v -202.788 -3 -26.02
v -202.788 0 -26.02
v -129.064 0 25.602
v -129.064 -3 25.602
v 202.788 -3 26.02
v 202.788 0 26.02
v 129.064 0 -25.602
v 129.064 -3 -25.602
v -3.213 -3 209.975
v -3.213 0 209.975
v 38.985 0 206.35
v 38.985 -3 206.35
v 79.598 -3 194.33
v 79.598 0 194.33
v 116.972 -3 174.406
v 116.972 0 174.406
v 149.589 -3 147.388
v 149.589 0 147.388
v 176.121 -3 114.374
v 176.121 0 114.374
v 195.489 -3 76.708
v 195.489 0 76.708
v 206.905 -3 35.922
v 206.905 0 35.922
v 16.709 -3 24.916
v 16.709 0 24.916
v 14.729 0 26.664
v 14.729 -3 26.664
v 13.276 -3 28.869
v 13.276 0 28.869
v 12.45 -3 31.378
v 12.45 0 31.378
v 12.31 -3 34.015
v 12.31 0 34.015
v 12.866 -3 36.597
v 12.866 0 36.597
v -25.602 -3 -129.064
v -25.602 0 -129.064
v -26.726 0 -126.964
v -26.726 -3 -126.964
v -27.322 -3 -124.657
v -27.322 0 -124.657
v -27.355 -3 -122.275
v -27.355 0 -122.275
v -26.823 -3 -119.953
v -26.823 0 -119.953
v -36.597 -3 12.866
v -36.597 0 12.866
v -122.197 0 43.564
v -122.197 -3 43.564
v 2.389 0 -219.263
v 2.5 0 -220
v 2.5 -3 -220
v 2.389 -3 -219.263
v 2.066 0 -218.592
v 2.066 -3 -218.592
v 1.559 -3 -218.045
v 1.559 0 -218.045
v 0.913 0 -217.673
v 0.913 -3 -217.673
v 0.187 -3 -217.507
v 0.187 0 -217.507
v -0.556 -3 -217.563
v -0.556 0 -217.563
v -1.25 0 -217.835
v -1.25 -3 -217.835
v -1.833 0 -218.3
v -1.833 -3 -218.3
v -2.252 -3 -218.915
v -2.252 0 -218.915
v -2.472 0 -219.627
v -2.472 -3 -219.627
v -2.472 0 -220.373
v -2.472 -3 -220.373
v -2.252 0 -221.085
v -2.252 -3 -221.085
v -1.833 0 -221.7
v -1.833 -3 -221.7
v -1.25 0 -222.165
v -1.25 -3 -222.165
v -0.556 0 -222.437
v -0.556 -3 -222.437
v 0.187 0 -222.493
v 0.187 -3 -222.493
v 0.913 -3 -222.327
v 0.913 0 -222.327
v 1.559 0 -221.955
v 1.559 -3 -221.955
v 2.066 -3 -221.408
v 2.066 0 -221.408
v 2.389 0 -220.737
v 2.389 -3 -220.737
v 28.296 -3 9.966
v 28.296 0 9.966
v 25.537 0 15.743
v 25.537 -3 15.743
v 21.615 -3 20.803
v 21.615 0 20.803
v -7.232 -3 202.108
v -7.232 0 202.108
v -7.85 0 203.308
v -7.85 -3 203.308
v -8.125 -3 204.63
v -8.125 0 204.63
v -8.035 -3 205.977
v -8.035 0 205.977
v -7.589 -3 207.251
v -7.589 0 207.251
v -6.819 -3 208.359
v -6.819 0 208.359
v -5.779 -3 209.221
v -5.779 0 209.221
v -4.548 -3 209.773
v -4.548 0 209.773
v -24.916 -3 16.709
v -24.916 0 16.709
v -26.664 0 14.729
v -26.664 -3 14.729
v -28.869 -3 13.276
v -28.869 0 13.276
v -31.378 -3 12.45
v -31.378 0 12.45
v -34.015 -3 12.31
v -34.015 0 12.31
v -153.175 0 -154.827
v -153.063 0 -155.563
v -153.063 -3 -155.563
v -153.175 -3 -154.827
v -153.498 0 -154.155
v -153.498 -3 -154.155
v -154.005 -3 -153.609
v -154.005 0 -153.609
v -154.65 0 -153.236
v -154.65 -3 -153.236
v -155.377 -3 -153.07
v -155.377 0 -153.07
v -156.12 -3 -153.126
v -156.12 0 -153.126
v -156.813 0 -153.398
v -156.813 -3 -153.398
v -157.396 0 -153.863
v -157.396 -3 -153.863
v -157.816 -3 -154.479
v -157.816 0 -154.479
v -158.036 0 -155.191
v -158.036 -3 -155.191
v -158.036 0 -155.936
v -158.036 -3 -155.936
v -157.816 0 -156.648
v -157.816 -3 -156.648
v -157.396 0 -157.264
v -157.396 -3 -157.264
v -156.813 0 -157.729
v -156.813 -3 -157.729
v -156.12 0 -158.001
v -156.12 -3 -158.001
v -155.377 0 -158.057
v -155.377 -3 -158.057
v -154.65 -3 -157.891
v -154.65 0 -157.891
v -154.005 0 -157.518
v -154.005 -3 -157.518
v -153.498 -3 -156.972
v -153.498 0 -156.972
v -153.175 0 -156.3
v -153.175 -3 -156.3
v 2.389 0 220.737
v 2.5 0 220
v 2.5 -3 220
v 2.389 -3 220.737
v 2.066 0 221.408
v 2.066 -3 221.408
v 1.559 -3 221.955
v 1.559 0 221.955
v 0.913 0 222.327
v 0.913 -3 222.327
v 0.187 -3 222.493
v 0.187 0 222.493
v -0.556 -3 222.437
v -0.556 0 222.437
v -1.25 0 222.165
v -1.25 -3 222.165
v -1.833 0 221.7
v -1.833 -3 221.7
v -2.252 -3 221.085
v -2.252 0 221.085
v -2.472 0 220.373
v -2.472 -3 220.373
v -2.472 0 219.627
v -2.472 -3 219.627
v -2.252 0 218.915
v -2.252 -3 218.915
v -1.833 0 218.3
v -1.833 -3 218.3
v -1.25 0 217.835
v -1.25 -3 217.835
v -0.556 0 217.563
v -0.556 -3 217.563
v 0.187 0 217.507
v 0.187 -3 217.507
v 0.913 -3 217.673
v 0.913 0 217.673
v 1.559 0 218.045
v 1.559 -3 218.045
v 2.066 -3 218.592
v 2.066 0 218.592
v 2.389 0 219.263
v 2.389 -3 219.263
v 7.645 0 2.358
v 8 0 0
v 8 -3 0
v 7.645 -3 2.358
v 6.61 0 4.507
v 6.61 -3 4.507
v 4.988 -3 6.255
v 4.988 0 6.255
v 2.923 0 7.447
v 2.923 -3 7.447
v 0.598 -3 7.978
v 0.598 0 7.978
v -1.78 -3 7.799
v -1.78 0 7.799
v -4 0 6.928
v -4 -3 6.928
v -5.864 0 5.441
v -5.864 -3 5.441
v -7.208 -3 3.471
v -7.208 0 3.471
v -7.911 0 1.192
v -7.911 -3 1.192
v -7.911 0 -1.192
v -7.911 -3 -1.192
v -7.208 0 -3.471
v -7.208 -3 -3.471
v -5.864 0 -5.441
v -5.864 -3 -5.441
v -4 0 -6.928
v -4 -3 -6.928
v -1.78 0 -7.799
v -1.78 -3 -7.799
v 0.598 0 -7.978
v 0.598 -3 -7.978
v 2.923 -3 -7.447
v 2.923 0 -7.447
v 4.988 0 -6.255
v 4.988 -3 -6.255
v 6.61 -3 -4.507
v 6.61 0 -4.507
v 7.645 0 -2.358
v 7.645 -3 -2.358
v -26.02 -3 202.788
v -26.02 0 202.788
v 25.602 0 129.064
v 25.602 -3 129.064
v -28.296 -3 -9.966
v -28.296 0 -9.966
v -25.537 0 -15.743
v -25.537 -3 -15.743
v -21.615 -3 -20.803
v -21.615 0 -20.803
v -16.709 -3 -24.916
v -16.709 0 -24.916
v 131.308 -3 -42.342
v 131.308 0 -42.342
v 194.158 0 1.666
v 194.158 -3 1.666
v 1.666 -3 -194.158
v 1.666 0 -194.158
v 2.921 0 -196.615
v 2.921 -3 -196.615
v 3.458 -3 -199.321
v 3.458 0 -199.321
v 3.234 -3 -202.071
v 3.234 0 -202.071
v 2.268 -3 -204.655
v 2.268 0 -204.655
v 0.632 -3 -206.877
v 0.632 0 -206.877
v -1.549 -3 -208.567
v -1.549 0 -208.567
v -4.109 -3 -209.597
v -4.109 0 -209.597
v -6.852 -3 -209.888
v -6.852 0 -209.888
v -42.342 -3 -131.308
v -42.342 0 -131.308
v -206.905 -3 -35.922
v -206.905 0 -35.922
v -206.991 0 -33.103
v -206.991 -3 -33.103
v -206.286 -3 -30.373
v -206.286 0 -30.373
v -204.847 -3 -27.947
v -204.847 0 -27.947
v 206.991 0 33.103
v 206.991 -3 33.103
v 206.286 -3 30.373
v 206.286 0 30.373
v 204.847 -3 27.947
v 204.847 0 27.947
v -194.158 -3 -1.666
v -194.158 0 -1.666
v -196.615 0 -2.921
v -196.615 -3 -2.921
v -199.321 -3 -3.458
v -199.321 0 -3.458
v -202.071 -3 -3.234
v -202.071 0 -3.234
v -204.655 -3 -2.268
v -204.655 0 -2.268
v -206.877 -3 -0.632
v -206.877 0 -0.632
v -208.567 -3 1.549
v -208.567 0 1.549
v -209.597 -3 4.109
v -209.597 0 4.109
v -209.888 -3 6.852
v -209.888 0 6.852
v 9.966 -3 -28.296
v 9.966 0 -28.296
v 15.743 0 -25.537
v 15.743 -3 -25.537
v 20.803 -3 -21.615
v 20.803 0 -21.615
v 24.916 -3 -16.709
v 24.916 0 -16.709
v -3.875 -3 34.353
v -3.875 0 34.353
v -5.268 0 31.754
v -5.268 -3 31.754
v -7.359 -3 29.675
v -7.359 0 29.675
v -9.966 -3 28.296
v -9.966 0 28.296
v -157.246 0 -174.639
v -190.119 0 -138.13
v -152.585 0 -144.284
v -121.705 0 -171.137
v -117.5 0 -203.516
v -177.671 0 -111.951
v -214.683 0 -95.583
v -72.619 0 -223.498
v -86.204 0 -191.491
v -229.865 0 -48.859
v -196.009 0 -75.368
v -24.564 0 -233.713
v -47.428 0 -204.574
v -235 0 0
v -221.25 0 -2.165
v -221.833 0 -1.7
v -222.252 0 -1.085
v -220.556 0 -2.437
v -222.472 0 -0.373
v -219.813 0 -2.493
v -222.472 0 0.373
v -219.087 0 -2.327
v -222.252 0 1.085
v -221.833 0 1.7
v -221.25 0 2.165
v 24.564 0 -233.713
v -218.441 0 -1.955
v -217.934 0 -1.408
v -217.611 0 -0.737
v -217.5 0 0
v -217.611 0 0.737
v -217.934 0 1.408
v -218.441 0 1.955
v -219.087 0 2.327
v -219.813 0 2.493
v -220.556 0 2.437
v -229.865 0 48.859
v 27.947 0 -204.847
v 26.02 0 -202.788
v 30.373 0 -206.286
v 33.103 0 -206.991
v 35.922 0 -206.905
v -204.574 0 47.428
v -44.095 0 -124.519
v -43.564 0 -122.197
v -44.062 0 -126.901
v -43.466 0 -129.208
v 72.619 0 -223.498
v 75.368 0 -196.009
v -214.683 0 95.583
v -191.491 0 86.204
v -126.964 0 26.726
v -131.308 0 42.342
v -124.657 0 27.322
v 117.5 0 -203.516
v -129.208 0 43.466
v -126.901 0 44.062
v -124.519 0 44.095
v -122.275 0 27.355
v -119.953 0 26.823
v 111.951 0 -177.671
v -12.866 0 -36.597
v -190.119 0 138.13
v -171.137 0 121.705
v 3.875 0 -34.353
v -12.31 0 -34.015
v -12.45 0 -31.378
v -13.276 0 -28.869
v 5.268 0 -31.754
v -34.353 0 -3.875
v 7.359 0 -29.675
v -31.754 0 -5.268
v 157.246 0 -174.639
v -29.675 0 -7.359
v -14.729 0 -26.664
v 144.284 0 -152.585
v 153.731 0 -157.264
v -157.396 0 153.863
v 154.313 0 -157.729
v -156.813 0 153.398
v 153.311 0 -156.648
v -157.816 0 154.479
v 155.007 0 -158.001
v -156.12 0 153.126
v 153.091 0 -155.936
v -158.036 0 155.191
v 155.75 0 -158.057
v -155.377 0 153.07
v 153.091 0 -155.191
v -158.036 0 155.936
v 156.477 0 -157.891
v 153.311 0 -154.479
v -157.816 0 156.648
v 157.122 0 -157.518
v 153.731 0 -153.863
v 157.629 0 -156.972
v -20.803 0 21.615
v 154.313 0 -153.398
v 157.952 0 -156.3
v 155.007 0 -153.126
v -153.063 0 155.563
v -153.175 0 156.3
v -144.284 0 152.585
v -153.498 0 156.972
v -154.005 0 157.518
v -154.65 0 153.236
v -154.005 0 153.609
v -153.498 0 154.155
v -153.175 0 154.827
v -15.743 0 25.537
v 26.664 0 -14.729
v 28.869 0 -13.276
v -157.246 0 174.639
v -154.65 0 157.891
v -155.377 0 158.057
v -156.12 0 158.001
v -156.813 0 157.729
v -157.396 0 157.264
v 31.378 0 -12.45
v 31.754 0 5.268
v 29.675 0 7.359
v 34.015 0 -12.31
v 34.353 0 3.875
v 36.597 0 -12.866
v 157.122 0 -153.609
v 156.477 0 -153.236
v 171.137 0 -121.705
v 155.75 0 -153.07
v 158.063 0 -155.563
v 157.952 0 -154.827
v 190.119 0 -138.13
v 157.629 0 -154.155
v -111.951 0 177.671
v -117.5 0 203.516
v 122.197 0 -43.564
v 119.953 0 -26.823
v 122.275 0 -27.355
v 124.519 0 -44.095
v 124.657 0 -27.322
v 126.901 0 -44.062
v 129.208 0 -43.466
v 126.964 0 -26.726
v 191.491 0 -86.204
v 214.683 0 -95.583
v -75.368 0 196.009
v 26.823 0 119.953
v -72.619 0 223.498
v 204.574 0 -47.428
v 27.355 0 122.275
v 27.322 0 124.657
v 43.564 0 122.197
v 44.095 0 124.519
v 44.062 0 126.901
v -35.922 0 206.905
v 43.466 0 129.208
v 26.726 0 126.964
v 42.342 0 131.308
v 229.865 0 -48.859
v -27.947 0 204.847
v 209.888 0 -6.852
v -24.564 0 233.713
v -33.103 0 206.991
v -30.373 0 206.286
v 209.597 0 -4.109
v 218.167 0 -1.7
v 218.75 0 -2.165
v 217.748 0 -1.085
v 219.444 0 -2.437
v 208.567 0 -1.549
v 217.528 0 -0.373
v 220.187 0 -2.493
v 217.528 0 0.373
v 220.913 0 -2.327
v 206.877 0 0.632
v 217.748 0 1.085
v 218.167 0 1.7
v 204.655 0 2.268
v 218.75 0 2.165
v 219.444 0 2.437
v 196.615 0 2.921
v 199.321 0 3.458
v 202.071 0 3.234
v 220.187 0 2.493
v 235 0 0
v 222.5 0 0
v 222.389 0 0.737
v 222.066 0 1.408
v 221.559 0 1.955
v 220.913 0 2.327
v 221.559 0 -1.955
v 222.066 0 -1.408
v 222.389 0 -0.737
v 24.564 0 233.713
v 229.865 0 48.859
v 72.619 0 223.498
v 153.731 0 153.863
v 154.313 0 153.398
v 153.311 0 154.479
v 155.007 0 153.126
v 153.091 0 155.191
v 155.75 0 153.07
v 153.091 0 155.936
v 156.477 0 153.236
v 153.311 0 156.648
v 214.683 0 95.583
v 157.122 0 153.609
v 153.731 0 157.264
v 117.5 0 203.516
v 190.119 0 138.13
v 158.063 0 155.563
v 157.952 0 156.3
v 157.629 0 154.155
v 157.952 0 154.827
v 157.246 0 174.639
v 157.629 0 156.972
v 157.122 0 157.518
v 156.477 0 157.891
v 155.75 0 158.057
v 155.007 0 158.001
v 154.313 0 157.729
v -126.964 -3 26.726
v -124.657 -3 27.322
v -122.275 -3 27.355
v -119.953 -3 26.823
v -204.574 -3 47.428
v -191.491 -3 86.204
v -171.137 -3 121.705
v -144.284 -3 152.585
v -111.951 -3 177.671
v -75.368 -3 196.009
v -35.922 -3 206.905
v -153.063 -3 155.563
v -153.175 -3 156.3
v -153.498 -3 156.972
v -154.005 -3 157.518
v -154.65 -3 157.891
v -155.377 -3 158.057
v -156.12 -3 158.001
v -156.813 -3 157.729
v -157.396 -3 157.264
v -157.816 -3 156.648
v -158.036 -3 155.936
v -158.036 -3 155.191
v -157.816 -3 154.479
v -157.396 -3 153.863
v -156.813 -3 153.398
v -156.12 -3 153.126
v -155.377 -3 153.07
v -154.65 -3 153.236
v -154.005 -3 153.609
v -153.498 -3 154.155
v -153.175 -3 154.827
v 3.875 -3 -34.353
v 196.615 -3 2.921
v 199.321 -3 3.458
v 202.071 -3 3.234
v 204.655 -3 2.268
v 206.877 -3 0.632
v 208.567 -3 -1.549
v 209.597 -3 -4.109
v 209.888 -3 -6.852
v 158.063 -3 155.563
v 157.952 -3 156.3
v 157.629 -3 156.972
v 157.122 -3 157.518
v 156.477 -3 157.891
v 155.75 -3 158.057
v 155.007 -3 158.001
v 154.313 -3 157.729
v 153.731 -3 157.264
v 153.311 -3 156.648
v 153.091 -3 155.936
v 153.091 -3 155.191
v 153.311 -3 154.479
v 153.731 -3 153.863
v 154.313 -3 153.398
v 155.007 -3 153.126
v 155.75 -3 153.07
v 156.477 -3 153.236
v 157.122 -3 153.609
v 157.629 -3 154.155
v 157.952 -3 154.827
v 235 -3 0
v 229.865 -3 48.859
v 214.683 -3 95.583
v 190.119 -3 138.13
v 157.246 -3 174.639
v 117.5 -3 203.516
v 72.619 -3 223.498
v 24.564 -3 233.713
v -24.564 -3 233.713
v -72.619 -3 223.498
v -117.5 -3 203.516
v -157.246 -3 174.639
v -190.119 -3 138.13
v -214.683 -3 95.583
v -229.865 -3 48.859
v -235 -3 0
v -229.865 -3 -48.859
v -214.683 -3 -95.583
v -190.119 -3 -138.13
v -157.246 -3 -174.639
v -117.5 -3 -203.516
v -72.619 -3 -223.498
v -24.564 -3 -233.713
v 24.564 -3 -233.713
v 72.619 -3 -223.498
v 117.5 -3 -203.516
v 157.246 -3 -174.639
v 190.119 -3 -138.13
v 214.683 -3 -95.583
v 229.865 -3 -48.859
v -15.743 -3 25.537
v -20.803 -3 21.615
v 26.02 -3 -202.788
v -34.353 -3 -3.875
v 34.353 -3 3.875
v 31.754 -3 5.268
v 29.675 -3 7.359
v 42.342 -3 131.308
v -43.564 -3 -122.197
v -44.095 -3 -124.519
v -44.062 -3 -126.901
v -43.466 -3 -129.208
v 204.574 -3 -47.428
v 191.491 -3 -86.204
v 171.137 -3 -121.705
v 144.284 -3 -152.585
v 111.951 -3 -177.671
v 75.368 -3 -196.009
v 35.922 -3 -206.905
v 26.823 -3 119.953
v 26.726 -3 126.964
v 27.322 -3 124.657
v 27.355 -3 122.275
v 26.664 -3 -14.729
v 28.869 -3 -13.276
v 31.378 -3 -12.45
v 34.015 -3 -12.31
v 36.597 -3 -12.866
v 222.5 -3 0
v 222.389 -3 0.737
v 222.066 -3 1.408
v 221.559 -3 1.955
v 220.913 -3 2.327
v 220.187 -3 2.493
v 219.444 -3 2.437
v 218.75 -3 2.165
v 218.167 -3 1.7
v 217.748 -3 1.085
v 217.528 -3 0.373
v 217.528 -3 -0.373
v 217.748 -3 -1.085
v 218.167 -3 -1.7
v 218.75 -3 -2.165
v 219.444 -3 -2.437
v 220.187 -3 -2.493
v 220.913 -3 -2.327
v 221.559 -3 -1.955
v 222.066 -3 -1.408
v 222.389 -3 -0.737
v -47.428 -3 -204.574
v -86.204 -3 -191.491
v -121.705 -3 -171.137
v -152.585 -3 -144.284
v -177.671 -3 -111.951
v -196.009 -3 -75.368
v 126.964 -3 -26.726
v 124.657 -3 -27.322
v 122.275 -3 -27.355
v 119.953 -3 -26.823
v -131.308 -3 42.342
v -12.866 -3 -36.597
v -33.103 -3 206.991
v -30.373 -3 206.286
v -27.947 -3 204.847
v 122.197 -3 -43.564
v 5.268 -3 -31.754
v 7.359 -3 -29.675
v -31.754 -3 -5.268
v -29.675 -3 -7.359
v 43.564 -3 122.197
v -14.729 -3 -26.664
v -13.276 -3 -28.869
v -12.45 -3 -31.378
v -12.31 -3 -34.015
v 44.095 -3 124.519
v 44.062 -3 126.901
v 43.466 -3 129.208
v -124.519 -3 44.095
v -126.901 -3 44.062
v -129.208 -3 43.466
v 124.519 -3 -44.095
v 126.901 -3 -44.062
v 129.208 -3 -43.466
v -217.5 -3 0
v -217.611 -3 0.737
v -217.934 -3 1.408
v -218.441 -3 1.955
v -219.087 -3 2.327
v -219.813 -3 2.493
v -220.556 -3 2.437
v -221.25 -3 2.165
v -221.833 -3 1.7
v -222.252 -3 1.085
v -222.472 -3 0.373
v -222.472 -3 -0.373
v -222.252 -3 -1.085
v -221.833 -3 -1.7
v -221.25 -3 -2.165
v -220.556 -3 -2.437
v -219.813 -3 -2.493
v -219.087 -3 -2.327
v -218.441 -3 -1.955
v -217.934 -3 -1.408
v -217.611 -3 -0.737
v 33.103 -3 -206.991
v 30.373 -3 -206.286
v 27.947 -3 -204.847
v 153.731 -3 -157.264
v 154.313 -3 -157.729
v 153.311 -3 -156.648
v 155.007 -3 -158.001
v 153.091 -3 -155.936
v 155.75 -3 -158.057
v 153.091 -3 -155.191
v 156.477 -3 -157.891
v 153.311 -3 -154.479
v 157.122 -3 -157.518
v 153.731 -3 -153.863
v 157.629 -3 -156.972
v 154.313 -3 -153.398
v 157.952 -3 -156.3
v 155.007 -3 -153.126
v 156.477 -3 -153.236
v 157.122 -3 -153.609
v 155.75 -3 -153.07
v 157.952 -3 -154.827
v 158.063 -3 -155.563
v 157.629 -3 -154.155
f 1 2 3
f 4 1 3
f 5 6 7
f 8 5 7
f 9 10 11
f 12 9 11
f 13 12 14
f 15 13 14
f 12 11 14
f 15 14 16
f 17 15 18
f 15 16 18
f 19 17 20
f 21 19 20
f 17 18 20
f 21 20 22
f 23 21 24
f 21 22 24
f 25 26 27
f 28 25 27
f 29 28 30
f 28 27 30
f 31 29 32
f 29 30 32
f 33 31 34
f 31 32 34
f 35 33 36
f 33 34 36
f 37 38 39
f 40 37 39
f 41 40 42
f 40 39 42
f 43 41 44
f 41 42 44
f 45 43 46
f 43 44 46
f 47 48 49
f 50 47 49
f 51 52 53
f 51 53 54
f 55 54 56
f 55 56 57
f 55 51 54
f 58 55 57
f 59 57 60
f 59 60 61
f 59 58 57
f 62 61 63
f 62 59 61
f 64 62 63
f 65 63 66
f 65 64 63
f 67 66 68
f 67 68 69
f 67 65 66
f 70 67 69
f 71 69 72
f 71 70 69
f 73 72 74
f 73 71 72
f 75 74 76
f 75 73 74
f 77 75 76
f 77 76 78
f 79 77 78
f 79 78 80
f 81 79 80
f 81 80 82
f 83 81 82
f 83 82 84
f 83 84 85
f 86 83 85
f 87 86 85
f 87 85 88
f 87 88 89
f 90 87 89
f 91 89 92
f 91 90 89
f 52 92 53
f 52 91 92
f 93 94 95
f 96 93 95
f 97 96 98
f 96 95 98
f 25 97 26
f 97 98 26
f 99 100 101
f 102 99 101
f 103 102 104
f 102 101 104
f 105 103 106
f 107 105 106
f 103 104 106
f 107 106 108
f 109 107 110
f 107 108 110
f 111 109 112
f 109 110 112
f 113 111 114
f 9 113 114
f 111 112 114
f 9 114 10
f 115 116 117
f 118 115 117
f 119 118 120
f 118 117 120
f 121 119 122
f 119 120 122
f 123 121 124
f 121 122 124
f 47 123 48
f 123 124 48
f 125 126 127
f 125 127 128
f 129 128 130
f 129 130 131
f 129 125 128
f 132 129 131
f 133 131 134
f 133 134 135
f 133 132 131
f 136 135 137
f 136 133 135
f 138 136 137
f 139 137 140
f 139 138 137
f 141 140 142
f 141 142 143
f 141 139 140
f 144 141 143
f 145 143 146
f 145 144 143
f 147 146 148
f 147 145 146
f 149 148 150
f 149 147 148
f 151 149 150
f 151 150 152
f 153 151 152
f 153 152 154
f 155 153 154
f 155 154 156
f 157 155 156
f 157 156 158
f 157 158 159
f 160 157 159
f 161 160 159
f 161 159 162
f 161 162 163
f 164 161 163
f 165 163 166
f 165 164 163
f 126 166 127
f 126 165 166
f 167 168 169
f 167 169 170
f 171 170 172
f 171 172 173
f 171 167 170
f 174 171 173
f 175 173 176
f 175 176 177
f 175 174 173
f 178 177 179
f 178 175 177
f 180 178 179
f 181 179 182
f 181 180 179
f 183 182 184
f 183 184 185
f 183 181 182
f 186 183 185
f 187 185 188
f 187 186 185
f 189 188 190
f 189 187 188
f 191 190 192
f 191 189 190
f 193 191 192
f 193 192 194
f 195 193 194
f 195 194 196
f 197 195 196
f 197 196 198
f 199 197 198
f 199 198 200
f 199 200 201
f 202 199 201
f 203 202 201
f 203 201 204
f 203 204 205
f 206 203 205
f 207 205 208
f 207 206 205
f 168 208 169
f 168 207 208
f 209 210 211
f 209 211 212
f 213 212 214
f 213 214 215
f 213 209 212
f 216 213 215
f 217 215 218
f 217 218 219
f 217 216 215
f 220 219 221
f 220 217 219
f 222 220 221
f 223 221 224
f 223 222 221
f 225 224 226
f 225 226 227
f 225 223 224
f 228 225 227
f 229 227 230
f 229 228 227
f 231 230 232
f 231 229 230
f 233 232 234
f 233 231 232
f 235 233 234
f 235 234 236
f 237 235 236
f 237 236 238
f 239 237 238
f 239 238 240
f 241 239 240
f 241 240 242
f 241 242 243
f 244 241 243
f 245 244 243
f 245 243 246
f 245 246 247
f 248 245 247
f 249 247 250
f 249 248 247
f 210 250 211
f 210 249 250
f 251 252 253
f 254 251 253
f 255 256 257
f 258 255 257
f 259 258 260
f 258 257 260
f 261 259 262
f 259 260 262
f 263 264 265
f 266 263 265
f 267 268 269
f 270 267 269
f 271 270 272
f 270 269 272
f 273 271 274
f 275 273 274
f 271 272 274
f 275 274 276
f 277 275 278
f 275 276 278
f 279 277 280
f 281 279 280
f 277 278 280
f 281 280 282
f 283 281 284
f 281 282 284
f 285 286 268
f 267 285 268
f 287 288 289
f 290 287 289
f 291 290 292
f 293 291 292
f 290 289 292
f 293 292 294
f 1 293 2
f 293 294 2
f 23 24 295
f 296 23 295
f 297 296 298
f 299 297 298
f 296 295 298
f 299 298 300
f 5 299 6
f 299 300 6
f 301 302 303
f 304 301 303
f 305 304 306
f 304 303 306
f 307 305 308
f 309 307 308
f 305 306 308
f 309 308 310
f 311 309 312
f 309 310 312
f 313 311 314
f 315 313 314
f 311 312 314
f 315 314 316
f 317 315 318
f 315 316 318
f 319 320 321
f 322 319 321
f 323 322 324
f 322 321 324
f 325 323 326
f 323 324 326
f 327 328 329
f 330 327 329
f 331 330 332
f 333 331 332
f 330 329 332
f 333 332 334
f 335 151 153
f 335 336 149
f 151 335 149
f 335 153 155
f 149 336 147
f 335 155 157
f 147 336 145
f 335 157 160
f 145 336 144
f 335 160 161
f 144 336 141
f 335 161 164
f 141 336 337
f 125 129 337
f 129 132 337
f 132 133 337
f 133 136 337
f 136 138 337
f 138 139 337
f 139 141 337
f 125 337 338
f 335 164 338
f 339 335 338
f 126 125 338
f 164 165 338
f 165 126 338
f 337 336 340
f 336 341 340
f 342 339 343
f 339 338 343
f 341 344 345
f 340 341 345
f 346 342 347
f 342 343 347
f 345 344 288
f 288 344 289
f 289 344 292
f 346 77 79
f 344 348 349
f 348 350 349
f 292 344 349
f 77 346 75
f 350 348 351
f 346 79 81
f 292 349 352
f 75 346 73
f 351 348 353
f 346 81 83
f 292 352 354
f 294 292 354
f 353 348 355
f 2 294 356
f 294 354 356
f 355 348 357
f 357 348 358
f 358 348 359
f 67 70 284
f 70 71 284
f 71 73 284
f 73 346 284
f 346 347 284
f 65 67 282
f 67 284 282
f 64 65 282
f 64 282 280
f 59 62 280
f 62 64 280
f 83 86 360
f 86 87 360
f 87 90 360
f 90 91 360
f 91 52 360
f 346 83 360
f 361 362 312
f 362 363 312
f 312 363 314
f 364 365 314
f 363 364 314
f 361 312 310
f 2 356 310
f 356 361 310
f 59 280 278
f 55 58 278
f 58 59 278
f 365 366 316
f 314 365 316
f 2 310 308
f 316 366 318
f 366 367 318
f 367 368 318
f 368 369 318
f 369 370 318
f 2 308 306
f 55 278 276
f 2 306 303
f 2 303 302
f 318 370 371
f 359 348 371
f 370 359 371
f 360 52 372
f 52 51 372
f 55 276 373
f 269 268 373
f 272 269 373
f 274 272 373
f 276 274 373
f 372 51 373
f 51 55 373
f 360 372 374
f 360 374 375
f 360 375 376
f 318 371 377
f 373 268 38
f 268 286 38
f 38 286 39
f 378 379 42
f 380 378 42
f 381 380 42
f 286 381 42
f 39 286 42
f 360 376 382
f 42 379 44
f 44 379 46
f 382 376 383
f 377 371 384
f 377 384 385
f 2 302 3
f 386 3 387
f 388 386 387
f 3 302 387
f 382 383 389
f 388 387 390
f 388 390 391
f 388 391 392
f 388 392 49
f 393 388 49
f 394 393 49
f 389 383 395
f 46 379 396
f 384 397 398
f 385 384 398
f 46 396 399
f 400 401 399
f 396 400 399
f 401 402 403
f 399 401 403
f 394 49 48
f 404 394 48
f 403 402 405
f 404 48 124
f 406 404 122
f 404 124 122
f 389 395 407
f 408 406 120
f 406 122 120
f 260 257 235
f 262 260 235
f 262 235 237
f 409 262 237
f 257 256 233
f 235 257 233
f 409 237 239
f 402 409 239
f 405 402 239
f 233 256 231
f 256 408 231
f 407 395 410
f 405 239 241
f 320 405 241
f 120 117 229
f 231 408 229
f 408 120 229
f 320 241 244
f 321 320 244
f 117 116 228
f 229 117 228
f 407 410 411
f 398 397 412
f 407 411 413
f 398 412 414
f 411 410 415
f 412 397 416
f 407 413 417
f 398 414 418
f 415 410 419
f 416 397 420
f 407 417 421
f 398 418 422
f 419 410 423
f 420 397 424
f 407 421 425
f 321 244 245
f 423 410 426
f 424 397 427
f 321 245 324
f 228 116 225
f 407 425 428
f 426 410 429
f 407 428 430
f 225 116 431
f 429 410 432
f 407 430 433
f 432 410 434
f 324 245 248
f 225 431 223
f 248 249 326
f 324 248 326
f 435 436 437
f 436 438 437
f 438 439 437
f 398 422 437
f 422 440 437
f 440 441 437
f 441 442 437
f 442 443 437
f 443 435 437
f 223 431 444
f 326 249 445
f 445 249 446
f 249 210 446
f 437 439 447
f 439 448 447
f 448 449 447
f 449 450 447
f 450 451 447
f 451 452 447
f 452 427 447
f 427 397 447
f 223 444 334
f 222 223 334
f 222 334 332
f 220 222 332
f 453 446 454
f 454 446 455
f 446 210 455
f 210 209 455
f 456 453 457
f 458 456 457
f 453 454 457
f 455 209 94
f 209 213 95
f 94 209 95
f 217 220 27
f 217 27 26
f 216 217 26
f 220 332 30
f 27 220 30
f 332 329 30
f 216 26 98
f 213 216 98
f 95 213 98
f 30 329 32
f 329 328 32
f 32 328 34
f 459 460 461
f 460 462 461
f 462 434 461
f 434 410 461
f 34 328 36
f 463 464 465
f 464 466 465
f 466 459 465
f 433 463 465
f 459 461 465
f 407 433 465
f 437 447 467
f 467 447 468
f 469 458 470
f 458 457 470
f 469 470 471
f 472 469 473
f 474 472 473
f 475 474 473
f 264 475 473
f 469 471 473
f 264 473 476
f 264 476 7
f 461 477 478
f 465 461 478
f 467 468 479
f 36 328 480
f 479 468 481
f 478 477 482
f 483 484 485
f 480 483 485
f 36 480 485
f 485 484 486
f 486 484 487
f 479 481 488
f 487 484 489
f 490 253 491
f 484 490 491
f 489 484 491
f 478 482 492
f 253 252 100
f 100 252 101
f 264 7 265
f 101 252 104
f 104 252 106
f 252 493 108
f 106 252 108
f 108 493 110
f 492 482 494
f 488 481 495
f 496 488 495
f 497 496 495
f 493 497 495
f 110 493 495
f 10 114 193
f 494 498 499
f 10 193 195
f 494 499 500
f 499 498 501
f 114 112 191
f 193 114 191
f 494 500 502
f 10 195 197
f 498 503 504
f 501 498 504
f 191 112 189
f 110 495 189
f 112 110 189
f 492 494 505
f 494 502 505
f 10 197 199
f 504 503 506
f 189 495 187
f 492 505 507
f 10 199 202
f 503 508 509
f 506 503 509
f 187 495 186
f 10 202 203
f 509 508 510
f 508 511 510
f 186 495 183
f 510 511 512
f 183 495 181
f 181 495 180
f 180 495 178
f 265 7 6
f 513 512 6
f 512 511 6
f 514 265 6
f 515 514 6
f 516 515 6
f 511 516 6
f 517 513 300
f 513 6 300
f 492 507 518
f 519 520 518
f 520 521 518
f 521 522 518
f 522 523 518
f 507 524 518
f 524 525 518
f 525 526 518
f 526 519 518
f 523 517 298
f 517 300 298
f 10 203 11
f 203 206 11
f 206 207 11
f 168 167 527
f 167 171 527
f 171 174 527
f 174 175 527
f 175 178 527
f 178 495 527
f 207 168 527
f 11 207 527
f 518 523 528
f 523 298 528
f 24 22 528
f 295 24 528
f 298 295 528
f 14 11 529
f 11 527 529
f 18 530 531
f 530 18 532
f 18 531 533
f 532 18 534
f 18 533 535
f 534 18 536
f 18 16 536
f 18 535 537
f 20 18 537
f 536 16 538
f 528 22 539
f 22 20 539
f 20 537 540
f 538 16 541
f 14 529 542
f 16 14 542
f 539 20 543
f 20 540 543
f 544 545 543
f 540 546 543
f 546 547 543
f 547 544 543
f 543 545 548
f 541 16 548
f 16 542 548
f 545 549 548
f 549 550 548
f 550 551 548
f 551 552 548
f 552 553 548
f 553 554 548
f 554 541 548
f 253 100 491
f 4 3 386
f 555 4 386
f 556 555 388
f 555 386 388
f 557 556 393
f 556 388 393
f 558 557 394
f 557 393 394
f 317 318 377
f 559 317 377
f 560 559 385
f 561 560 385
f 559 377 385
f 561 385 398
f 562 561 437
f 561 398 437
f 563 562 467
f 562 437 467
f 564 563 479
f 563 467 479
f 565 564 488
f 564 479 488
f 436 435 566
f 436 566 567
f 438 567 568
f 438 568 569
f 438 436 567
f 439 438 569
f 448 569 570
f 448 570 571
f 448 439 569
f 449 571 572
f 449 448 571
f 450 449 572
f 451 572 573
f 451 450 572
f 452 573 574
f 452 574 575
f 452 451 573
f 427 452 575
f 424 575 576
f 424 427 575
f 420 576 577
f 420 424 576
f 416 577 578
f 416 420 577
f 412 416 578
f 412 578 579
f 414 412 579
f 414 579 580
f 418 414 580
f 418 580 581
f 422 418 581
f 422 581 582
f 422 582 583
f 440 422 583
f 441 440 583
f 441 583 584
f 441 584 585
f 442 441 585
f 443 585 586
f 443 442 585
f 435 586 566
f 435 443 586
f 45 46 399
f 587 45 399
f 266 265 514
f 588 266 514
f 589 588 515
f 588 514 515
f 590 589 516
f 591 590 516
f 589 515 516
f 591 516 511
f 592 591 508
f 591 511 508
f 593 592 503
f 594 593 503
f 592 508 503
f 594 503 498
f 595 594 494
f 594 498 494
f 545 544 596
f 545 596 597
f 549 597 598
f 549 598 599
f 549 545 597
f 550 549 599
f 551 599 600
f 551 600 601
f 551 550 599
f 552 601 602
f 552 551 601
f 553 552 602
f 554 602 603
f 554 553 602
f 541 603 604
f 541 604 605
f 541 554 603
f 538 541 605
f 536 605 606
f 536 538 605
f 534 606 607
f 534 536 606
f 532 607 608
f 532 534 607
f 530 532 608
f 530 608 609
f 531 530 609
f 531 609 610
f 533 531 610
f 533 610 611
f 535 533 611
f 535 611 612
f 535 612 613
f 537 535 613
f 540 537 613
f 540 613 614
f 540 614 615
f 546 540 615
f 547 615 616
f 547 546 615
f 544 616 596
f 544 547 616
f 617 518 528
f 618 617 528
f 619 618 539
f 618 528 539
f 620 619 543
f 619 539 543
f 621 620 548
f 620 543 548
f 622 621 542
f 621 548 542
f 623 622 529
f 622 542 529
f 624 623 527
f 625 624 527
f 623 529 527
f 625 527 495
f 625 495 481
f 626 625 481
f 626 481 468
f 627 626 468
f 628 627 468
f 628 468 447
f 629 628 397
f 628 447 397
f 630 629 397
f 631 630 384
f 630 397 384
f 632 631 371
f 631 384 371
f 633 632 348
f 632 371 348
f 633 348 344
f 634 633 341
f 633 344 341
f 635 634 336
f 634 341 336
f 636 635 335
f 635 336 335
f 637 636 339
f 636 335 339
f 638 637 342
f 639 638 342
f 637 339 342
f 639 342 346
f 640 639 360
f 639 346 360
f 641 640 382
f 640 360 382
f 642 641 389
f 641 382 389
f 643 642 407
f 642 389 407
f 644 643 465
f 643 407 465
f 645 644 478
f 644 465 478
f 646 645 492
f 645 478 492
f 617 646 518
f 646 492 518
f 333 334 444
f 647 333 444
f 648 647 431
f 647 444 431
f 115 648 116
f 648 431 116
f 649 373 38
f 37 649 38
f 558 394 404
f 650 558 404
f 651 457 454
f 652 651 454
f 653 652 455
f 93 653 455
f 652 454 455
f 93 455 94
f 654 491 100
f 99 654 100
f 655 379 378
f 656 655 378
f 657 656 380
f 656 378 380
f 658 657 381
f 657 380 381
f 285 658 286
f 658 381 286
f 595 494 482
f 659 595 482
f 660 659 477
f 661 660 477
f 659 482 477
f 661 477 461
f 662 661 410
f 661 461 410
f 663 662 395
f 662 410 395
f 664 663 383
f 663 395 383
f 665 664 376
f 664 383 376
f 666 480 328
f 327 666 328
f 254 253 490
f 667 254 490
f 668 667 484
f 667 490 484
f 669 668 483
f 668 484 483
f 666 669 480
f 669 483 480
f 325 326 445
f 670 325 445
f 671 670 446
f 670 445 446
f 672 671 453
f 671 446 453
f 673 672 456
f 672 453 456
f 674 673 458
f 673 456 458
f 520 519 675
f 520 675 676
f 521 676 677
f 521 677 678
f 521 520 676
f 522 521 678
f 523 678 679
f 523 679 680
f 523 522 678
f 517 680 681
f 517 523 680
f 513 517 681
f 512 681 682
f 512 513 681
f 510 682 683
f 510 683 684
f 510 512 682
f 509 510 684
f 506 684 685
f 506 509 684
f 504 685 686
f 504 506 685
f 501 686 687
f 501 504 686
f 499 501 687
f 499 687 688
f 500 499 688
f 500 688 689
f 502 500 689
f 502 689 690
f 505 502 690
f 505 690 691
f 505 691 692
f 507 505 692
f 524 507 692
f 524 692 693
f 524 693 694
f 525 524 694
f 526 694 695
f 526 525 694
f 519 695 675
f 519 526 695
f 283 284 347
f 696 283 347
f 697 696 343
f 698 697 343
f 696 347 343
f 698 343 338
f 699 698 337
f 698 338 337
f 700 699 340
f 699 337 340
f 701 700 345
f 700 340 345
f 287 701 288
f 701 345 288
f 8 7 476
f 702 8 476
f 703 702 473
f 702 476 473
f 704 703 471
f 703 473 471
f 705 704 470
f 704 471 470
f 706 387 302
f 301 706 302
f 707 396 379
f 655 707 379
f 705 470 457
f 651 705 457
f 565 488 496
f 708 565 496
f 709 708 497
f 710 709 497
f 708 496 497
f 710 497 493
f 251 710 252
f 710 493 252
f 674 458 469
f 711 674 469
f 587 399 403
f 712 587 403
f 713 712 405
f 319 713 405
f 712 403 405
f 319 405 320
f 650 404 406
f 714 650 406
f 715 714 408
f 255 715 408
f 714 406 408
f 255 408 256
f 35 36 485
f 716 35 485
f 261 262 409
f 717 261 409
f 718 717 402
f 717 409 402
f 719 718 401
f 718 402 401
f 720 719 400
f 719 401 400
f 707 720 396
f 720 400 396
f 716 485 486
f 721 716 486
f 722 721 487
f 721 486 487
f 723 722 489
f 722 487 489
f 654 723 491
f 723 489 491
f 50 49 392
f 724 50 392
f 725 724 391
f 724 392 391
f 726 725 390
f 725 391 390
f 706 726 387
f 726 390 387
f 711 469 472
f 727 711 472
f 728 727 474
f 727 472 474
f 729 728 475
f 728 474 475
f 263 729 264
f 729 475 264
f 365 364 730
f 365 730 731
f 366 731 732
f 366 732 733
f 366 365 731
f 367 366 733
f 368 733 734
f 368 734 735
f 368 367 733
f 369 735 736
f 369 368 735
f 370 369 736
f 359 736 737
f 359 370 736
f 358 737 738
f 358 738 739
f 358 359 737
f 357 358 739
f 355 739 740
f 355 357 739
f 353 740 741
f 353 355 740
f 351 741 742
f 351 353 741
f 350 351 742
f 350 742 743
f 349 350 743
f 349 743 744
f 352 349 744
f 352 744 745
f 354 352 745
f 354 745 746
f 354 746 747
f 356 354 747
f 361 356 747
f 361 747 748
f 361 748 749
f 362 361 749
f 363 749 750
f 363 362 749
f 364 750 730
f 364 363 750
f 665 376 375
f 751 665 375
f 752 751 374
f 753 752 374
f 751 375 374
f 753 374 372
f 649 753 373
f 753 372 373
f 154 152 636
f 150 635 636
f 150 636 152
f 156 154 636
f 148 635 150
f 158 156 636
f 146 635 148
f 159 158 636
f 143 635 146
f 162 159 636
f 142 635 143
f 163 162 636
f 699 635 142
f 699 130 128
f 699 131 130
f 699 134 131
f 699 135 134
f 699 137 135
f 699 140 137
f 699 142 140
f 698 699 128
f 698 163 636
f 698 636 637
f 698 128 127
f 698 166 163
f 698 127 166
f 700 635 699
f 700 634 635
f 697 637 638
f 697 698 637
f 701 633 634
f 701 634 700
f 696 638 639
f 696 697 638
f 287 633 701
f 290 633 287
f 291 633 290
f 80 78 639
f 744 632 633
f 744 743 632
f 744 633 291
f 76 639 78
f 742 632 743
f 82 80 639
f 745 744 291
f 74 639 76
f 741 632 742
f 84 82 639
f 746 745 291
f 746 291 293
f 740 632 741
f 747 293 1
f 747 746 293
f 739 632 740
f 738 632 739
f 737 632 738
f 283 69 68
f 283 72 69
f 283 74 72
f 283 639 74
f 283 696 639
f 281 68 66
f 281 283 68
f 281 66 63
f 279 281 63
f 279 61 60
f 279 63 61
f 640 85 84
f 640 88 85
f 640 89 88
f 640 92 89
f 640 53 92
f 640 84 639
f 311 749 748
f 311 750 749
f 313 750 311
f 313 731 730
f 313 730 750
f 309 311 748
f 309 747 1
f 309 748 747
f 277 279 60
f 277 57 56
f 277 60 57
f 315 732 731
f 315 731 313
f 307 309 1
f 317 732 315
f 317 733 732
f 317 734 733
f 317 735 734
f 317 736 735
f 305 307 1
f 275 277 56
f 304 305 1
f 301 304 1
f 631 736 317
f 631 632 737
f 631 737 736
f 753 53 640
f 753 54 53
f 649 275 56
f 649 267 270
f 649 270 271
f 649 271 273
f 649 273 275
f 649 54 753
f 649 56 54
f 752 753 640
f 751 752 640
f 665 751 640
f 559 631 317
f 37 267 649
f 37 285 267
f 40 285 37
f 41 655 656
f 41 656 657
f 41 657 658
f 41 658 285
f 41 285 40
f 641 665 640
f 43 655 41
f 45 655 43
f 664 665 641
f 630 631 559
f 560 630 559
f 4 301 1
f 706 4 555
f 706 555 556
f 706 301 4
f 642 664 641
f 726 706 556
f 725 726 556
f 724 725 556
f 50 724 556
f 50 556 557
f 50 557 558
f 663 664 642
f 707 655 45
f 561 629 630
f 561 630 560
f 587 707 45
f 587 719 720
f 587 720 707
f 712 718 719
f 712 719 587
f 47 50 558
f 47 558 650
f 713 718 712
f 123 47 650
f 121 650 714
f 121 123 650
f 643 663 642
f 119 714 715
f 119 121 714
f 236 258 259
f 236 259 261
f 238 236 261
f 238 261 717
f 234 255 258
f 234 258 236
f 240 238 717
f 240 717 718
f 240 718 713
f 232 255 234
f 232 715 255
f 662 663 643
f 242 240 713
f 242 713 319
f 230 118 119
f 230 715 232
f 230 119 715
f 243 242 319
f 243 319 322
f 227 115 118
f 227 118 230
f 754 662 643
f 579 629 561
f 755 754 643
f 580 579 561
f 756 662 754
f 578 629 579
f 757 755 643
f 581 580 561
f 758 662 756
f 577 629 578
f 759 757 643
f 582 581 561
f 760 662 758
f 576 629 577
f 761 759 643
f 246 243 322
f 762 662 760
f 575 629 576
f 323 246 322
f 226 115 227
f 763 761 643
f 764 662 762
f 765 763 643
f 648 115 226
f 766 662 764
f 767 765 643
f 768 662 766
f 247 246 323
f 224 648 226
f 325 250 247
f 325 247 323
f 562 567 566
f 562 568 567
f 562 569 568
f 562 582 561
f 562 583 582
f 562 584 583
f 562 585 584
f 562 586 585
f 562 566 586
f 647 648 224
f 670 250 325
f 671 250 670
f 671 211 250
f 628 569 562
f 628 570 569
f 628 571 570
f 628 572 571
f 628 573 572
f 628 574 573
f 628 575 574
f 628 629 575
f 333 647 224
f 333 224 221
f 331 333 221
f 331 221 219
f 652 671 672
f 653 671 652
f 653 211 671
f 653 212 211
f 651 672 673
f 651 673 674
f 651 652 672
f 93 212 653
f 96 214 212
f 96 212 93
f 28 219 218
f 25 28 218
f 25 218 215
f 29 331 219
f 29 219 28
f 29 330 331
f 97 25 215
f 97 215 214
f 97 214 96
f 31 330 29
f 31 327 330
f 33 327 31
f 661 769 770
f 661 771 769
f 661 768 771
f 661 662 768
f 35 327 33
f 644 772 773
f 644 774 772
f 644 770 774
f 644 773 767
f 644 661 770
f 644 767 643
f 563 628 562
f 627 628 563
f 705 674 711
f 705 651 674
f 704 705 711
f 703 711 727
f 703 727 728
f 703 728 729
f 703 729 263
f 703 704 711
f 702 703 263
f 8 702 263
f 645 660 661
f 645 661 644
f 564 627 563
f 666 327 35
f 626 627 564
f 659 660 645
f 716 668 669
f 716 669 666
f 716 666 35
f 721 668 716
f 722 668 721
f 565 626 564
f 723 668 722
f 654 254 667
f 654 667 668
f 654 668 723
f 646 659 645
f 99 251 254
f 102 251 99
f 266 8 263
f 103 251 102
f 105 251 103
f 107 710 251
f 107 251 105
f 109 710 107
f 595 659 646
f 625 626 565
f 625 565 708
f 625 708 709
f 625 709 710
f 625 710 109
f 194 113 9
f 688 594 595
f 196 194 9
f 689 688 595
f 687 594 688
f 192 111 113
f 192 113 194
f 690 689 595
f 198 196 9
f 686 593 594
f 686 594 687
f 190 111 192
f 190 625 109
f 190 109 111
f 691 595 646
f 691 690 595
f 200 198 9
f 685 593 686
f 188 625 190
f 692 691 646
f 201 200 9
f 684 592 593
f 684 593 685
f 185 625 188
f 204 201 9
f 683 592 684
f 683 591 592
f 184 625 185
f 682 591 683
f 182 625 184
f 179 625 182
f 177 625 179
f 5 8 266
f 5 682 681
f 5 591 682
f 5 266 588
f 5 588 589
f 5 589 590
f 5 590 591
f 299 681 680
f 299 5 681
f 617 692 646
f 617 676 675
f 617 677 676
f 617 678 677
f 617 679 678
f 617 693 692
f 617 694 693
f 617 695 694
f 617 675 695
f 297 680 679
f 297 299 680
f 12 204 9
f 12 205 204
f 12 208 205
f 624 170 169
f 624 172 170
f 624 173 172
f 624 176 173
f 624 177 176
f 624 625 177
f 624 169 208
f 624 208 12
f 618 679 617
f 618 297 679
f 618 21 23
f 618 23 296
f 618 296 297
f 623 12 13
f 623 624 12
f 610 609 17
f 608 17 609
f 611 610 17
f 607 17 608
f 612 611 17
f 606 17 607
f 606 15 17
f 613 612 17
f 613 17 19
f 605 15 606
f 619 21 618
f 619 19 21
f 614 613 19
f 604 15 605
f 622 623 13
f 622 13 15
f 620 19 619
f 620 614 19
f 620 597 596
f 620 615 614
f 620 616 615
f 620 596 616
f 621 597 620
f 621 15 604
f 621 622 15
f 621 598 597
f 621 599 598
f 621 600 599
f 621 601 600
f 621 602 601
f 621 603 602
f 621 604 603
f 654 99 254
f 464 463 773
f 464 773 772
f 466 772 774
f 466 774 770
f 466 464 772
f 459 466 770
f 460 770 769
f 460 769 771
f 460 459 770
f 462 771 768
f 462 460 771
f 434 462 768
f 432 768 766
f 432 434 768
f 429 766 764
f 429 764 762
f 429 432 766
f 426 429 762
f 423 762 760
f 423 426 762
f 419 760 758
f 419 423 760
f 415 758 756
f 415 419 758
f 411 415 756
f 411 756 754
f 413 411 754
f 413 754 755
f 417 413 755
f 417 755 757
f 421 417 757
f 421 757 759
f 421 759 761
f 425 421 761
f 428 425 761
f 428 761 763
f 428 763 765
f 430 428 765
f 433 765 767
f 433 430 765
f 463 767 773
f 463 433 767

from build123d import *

# Parameters (mm, degrees)
F0_R     = 235
F0_R_2   = 2.5
F0_R_3   = 8
F1_DEPTH = 3


with BuildPart() as f1:
    # F0 (on Front) → F1 (new body)
    with BuildSketch(Plane.XZ):
        Circle(F0_R)
        with Locations((-155.563492, -155.563492)):
            Circle(F0_R_2, mode=Mode.SUBTRACT)
        with BuildLine():
            ThreePointArc((-129.064274, 25.601808), (-124.657231, 27.32162), (-119.952823, 26.823297))
            Line((-119.952823, 26.823297), (-34.352843, -3.874505))
            ThreePointArc((-34.352843, -3.874505), (-30.637301, -6.236665), (-28.296397, -9.965636))
            ThreePointArc((-28.296397, -9.965636), (-23.711827, -18.377956), (-16.709034, -24.916022))
            ThreePointArc((-16.709034, -24.916022), (-12.779669, -30.095956), (-12.865703, -36.59705))
            Line((-12.865703, -36.59705), (-43.563506, -122.197029))
            ThreePointArc((-43.563506, -122.197029), (-44.061828, -126.901437), (-42.342017, -131.30848))
            Line((-42.342017, -131.30848), (1.665505, -194.157735))
            ThreePointArc((1.665505, -194.157735), (2.267567, -204.655106), (-6.852316, -209.888174))
            ThreePointArc((-6.852316, -209.888174), (-137.800831, -158.464289), (-206.904803, -35.922171))
            ThreePointArc((-206.904803, -35.922171), (-206.28595, -30.372613), (-202.787958, -26.020071))
            Line((-202.787958, -26.020071), (-129.064274, 25.601808))
        make_face(mode=Mode.SUBTRACT)
        with Locations((0, -220)):
            Circle(F0_R_2, mode=Mode.SUBTRACT)
        with Locations((155.563492, -155.563492)):
            Circle(F0_R_2, mode=Mode.SUBTRACT)
        with BuildLine():
            ThreePointArc((24.916022, -16.709034), (30.095956, -12.779669), (36.59705, -12.865703))
            Line((36.59705, -12.865703), (122.197029, -43.563506))
            ThreePointArc((122.197029, -43.563506), (126.901437, -44.061828), (131.30848, -42.342017))
            Line((131.30848, -42.342017), (194.157735, 1.665505))
            ThreePointArc((194.157735, 1.665505), (204.655106, 2.267567), (209.888174, -6.852316))
            ThreePointArc((209.888174, -6.852316), (158.464289, -137.800831), (35.922171, -206.904803))
            ThreePointArc((35.922171, -206.904803), (30.372613, -206.28595), (26.020071, -202.787958))
            Line((26.020071, -202.787958), (-25.601808, -129.064274))
            ThreePointArc((-25.601808, -129.064274), (-27.32162, -124.657231), (-26.823297, -119.952823))
            Line((-26.823297, -119.952823), (3.874505, -34.352843))
            ThreePointArc((3.874505, -34.352843), (6.236665, -30.637301), (9.965636, -28.296397))
            ThreePointArc((9.965636, -28.296397), (18.377956, -23.711827), (24.916022, -16.709034))
        make_face(mode=Mode.SUBTRACT)
        with Locations((-220, 0)):
            Circle(F0_R_2, mode=Mode.SUBTRACT)
        with BuildLine():
            ThreePointArc((-3.874505, 34.352843), (-6.236665, 30.637301), (-9.965636, 28.296397))
            ThreePointArc((-9.965636, 28.296397), (-18.377956, 23.711827), (-24.916022, 16.709034))
            ThreePointArc((-24.916022, 16.709034), (-30.095956, 12.779669), (-36.59705, 12.865703))
            Line((-36.59705, 12.865703), (-122.197029, 43.563506))
            ThreePointArc((-122.197029, 43.563506), (-126.901437, 44.061828), (-131.30848, 42.342017))
            Line((-131.30848, 42.342017), (-194.157735, -1.665505))
            ThreePointArc((-194.157735, -1.665505), (-204.655106, -2.267567), (-209.888174, 6.852316))
            ThreePointArc((-209.888174, 6.852316), (-158.464289, 137.800831), (-35.922171, 206.904803))
            ThreePointArc((-35.922171, 206.904803), (-30.372613, 206.28595), (-26.020071, 202.787958))
            Line((-26.020071, 202.787958), (25.601808, 129.064274))
            ThreePointArc((25.601808, 129.064274), (27.32162, 124.657231), (26.823297, 119.952823))
            Line((26.823297, 119.952823), (-3.874505, 34.352843))
        make_face(mode=Mode.SUBTRACT)
        with Locations((-155.563492, 155.563492)):
            Circle(F0_R_2, mode=Mode.SUBTRACT)
        Circle(F0_R_3, mode=Mode.SUBTRACT)
        with BuildLine():
            ThreePointArc((-3.213168, 209.975417), (133.963441, 161.721354), (206.904803, 35.922171))
            ThreePointArc((206.904803, 35.922171), (206.28595, 30.372613), (202.787958, 26.020071))
            Line((202.787958, 26.020071), (129.064274, -25.601808))
            ThreePointArc((129.064274, -25.601808), (124.657231, -27.32162), (119.952823, -26.823297))
            Line((119.952823, -26.823297), (34.352843, 3.874505))
            ThreePointArc((34.352843, 3.874505), (30.637301, 6.236665), (28.296397, 9.965636))
            ThreePointArc((28.296397, 9.965636), (23.711827, 18.377956), (16.709034, 24.916022))
            ThreePointArc((16.709034, 24.916022), (12.779669, 30.095956), (12.865703, 36.59705))
            Line((12.865703, 36.59705), (43.563506, 122.197029))
            ThreePointArc((43.563506, 122.197029), (44.061828, 126.901437), (42.342017, 131.30848))
            Line((42.342017, 131.30848), (-7.232424, 202.10812))
            ThreePointArc((-7.232424, 202.10812), (-7.589252, 207.250746), (-3.213168, 209.975417))
        make_face(mode=Mode.SUBTRACT)
        with Locations((220, 0)):
            Circle(F0_R_2, mode=Mode.SUBTRACT)
        with Locations((0, 220)):
            Circle(F0_R_2, mode=Mode.SUBTRACT)
        with Locations((155.563492, 155.563492)):
            Circle(F0_R_2, mode=Mode.SUBTRACT)
    extrude(amount=F1_DEPTH)


solid = f1.part
